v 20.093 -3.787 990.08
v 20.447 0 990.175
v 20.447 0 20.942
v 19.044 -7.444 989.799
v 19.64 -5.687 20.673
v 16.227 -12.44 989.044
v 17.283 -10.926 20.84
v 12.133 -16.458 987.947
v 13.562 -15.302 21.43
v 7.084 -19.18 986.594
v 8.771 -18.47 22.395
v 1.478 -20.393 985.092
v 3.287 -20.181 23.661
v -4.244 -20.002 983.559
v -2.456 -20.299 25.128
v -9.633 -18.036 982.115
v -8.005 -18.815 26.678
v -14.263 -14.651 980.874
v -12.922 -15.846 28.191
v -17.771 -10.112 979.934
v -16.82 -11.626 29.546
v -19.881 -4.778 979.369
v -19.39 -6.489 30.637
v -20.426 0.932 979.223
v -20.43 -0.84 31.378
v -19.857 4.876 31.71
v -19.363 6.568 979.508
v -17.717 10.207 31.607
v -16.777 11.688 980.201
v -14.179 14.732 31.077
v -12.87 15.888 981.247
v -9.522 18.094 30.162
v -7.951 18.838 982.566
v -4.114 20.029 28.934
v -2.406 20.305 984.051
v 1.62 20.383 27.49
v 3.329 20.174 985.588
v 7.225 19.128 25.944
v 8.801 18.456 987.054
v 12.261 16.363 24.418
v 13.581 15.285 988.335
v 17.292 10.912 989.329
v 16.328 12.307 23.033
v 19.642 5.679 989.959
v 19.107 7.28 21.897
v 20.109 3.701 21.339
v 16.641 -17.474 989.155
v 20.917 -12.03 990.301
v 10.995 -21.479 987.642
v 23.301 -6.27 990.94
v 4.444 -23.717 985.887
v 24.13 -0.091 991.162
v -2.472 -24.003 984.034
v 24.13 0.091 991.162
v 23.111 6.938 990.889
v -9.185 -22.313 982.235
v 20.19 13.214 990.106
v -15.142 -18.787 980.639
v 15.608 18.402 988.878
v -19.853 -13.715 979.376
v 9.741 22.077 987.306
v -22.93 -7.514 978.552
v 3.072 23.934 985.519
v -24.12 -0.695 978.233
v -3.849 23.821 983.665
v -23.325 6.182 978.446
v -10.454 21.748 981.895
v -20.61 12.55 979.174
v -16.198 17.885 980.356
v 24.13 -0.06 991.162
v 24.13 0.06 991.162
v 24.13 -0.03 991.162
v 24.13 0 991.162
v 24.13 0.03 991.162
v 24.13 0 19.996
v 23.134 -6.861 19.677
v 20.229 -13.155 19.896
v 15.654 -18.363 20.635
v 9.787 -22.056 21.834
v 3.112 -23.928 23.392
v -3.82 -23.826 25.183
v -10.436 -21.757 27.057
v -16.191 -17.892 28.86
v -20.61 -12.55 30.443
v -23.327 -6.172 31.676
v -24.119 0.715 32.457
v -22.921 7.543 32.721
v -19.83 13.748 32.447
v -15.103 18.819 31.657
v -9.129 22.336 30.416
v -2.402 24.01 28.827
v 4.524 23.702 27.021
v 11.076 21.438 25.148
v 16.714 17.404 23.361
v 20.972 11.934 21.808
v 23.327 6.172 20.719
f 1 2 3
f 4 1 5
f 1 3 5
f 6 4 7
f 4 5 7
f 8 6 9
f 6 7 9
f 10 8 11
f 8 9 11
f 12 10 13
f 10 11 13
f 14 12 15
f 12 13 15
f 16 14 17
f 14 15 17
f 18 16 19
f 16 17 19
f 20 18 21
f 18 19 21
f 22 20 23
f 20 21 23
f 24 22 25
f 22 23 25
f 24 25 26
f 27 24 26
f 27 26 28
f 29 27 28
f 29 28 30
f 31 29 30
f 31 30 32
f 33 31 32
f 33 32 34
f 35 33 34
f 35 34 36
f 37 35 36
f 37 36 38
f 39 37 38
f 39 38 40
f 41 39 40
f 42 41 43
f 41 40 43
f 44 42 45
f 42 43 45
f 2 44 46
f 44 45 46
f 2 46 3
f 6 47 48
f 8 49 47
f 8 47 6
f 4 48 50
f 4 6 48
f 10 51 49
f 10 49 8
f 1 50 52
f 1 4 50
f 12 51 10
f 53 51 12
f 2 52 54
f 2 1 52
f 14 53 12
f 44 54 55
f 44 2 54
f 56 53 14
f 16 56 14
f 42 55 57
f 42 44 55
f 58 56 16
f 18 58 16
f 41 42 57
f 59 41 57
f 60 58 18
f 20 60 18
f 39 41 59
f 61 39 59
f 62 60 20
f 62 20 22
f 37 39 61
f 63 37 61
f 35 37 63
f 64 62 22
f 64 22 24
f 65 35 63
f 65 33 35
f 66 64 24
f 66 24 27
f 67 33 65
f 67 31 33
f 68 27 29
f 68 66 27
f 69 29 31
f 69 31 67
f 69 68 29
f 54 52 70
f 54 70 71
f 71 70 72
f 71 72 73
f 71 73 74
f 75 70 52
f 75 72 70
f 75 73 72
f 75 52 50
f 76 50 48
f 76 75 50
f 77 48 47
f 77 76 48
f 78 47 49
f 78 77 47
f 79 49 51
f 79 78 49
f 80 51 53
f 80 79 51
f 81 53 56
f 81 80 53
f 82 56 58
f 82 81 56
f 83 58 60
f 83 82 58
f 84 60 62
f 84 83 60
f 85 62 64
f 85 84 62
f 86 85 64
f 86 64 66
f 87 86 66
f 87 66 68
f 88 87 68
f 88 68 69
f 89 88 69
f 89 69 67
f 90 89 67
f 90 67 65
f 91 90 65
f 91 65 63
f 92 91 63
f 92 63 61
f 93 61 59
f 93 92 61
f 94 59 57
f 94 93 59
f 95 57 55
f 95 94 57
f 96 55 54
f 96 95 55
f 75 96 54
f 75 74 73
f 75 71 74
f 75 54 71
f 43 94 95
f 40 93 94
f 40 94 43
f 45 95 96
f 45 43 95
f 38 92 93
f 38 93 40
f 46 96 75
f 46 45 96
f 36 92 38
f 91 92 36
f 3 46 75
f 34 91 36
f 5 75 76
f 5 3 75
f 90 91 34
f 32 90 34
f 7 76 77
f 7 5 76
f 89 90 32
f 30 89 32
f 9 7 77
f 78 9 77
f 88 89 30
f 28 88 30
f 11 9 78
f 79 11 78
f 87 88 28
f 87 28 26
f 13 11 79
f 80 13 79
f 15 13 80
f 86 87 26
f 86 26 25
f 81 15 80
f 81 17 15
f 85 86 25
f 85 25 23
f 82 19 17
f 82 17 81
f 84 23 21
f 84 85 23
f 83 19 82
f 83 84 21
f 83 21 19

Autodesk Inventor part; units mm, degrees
ref_plane "Start Plane" through (0, 0, 17.9725) normal (0, 0, 1) x (1, 0, 0)
ref_plane "End Plane" through (0, 0, 991.1616) normal (0, 0, 1) x (1, 0, 0)
sketch "Sketch" plane through (0, 0, 0) normal (0, 0, 1) x (1, 0, 0)
  circle A0 centre (0, 0) radius 20.447
  circle A1 centre (0, 0) radius 24.13
  dimension "d0" = 48.26
  dimension "d1" = 3.683
extrude "Body" add sketch "Sketch" along normal up to surface (973.1891 mm away) from surface at 17.9725
sketch "Sketch3" plane through (0, 0, 0) normal (0, 0, 1) x (1, 0, 0)
  line L0 (0, 0) -> (10, 0)
ref_plane "Work Plane3" through (0, 0, 0) normal (0, -1, 0) x (1, 0, 0)
ref_plane "Work Plane4" through (-23.8819, -0.0809, 32.329) normal (-0.2481, 0.0809, -0.9653) x (-0.7765, 0.5792, 0.2481)
split "Split1" plane through (-23.8819, -0.0809, 32.329) removes the side toward (-0.2481, 0.0809, -0.9653)
ref_plane "Work Plane5" through (6.5041, 0, 986.4388) normal (-0.2588, 0, 0.9659) x (0.9659, 0, 0.2588)
split "Split2" plane through (6.5041, 0, 986.4388) removes the side toward (-0.2588, 0, 0.9659)
sketch "Sketch4" plane through (0, 0, 0) normal (0, -1, 0) x (1, 0, 0)
  line L0 (-2, 17.9725) -> (12, 17.9725) projected
  line L1 (-2, 991.1616) -> (12, 991.1616) projected
  dimension "d7" = 973.189
equation "\"d0\" = G_H"
equation "\"d1\" = G_T"
equation "\"d2\" = G_L"
equation "\"G_H\" = 48.26"
equation "\"G_T\" = 3.683"
equation "\"G_L\" = d7"
equation "\"G_OFFSET_START\" = -17.97254"
equation "\"G_OFFSET_END\" = -19.55088"
equation "\"d4\" = -G_OFFSET_START"
equation "\"d5\" = G_OFFSET_END + B_L"
equation "\"B_L\" = 1010.71247"
properties part number "ANSI - 1 1/2 x 0.145 - 38.315" material "Steel, Mild"
